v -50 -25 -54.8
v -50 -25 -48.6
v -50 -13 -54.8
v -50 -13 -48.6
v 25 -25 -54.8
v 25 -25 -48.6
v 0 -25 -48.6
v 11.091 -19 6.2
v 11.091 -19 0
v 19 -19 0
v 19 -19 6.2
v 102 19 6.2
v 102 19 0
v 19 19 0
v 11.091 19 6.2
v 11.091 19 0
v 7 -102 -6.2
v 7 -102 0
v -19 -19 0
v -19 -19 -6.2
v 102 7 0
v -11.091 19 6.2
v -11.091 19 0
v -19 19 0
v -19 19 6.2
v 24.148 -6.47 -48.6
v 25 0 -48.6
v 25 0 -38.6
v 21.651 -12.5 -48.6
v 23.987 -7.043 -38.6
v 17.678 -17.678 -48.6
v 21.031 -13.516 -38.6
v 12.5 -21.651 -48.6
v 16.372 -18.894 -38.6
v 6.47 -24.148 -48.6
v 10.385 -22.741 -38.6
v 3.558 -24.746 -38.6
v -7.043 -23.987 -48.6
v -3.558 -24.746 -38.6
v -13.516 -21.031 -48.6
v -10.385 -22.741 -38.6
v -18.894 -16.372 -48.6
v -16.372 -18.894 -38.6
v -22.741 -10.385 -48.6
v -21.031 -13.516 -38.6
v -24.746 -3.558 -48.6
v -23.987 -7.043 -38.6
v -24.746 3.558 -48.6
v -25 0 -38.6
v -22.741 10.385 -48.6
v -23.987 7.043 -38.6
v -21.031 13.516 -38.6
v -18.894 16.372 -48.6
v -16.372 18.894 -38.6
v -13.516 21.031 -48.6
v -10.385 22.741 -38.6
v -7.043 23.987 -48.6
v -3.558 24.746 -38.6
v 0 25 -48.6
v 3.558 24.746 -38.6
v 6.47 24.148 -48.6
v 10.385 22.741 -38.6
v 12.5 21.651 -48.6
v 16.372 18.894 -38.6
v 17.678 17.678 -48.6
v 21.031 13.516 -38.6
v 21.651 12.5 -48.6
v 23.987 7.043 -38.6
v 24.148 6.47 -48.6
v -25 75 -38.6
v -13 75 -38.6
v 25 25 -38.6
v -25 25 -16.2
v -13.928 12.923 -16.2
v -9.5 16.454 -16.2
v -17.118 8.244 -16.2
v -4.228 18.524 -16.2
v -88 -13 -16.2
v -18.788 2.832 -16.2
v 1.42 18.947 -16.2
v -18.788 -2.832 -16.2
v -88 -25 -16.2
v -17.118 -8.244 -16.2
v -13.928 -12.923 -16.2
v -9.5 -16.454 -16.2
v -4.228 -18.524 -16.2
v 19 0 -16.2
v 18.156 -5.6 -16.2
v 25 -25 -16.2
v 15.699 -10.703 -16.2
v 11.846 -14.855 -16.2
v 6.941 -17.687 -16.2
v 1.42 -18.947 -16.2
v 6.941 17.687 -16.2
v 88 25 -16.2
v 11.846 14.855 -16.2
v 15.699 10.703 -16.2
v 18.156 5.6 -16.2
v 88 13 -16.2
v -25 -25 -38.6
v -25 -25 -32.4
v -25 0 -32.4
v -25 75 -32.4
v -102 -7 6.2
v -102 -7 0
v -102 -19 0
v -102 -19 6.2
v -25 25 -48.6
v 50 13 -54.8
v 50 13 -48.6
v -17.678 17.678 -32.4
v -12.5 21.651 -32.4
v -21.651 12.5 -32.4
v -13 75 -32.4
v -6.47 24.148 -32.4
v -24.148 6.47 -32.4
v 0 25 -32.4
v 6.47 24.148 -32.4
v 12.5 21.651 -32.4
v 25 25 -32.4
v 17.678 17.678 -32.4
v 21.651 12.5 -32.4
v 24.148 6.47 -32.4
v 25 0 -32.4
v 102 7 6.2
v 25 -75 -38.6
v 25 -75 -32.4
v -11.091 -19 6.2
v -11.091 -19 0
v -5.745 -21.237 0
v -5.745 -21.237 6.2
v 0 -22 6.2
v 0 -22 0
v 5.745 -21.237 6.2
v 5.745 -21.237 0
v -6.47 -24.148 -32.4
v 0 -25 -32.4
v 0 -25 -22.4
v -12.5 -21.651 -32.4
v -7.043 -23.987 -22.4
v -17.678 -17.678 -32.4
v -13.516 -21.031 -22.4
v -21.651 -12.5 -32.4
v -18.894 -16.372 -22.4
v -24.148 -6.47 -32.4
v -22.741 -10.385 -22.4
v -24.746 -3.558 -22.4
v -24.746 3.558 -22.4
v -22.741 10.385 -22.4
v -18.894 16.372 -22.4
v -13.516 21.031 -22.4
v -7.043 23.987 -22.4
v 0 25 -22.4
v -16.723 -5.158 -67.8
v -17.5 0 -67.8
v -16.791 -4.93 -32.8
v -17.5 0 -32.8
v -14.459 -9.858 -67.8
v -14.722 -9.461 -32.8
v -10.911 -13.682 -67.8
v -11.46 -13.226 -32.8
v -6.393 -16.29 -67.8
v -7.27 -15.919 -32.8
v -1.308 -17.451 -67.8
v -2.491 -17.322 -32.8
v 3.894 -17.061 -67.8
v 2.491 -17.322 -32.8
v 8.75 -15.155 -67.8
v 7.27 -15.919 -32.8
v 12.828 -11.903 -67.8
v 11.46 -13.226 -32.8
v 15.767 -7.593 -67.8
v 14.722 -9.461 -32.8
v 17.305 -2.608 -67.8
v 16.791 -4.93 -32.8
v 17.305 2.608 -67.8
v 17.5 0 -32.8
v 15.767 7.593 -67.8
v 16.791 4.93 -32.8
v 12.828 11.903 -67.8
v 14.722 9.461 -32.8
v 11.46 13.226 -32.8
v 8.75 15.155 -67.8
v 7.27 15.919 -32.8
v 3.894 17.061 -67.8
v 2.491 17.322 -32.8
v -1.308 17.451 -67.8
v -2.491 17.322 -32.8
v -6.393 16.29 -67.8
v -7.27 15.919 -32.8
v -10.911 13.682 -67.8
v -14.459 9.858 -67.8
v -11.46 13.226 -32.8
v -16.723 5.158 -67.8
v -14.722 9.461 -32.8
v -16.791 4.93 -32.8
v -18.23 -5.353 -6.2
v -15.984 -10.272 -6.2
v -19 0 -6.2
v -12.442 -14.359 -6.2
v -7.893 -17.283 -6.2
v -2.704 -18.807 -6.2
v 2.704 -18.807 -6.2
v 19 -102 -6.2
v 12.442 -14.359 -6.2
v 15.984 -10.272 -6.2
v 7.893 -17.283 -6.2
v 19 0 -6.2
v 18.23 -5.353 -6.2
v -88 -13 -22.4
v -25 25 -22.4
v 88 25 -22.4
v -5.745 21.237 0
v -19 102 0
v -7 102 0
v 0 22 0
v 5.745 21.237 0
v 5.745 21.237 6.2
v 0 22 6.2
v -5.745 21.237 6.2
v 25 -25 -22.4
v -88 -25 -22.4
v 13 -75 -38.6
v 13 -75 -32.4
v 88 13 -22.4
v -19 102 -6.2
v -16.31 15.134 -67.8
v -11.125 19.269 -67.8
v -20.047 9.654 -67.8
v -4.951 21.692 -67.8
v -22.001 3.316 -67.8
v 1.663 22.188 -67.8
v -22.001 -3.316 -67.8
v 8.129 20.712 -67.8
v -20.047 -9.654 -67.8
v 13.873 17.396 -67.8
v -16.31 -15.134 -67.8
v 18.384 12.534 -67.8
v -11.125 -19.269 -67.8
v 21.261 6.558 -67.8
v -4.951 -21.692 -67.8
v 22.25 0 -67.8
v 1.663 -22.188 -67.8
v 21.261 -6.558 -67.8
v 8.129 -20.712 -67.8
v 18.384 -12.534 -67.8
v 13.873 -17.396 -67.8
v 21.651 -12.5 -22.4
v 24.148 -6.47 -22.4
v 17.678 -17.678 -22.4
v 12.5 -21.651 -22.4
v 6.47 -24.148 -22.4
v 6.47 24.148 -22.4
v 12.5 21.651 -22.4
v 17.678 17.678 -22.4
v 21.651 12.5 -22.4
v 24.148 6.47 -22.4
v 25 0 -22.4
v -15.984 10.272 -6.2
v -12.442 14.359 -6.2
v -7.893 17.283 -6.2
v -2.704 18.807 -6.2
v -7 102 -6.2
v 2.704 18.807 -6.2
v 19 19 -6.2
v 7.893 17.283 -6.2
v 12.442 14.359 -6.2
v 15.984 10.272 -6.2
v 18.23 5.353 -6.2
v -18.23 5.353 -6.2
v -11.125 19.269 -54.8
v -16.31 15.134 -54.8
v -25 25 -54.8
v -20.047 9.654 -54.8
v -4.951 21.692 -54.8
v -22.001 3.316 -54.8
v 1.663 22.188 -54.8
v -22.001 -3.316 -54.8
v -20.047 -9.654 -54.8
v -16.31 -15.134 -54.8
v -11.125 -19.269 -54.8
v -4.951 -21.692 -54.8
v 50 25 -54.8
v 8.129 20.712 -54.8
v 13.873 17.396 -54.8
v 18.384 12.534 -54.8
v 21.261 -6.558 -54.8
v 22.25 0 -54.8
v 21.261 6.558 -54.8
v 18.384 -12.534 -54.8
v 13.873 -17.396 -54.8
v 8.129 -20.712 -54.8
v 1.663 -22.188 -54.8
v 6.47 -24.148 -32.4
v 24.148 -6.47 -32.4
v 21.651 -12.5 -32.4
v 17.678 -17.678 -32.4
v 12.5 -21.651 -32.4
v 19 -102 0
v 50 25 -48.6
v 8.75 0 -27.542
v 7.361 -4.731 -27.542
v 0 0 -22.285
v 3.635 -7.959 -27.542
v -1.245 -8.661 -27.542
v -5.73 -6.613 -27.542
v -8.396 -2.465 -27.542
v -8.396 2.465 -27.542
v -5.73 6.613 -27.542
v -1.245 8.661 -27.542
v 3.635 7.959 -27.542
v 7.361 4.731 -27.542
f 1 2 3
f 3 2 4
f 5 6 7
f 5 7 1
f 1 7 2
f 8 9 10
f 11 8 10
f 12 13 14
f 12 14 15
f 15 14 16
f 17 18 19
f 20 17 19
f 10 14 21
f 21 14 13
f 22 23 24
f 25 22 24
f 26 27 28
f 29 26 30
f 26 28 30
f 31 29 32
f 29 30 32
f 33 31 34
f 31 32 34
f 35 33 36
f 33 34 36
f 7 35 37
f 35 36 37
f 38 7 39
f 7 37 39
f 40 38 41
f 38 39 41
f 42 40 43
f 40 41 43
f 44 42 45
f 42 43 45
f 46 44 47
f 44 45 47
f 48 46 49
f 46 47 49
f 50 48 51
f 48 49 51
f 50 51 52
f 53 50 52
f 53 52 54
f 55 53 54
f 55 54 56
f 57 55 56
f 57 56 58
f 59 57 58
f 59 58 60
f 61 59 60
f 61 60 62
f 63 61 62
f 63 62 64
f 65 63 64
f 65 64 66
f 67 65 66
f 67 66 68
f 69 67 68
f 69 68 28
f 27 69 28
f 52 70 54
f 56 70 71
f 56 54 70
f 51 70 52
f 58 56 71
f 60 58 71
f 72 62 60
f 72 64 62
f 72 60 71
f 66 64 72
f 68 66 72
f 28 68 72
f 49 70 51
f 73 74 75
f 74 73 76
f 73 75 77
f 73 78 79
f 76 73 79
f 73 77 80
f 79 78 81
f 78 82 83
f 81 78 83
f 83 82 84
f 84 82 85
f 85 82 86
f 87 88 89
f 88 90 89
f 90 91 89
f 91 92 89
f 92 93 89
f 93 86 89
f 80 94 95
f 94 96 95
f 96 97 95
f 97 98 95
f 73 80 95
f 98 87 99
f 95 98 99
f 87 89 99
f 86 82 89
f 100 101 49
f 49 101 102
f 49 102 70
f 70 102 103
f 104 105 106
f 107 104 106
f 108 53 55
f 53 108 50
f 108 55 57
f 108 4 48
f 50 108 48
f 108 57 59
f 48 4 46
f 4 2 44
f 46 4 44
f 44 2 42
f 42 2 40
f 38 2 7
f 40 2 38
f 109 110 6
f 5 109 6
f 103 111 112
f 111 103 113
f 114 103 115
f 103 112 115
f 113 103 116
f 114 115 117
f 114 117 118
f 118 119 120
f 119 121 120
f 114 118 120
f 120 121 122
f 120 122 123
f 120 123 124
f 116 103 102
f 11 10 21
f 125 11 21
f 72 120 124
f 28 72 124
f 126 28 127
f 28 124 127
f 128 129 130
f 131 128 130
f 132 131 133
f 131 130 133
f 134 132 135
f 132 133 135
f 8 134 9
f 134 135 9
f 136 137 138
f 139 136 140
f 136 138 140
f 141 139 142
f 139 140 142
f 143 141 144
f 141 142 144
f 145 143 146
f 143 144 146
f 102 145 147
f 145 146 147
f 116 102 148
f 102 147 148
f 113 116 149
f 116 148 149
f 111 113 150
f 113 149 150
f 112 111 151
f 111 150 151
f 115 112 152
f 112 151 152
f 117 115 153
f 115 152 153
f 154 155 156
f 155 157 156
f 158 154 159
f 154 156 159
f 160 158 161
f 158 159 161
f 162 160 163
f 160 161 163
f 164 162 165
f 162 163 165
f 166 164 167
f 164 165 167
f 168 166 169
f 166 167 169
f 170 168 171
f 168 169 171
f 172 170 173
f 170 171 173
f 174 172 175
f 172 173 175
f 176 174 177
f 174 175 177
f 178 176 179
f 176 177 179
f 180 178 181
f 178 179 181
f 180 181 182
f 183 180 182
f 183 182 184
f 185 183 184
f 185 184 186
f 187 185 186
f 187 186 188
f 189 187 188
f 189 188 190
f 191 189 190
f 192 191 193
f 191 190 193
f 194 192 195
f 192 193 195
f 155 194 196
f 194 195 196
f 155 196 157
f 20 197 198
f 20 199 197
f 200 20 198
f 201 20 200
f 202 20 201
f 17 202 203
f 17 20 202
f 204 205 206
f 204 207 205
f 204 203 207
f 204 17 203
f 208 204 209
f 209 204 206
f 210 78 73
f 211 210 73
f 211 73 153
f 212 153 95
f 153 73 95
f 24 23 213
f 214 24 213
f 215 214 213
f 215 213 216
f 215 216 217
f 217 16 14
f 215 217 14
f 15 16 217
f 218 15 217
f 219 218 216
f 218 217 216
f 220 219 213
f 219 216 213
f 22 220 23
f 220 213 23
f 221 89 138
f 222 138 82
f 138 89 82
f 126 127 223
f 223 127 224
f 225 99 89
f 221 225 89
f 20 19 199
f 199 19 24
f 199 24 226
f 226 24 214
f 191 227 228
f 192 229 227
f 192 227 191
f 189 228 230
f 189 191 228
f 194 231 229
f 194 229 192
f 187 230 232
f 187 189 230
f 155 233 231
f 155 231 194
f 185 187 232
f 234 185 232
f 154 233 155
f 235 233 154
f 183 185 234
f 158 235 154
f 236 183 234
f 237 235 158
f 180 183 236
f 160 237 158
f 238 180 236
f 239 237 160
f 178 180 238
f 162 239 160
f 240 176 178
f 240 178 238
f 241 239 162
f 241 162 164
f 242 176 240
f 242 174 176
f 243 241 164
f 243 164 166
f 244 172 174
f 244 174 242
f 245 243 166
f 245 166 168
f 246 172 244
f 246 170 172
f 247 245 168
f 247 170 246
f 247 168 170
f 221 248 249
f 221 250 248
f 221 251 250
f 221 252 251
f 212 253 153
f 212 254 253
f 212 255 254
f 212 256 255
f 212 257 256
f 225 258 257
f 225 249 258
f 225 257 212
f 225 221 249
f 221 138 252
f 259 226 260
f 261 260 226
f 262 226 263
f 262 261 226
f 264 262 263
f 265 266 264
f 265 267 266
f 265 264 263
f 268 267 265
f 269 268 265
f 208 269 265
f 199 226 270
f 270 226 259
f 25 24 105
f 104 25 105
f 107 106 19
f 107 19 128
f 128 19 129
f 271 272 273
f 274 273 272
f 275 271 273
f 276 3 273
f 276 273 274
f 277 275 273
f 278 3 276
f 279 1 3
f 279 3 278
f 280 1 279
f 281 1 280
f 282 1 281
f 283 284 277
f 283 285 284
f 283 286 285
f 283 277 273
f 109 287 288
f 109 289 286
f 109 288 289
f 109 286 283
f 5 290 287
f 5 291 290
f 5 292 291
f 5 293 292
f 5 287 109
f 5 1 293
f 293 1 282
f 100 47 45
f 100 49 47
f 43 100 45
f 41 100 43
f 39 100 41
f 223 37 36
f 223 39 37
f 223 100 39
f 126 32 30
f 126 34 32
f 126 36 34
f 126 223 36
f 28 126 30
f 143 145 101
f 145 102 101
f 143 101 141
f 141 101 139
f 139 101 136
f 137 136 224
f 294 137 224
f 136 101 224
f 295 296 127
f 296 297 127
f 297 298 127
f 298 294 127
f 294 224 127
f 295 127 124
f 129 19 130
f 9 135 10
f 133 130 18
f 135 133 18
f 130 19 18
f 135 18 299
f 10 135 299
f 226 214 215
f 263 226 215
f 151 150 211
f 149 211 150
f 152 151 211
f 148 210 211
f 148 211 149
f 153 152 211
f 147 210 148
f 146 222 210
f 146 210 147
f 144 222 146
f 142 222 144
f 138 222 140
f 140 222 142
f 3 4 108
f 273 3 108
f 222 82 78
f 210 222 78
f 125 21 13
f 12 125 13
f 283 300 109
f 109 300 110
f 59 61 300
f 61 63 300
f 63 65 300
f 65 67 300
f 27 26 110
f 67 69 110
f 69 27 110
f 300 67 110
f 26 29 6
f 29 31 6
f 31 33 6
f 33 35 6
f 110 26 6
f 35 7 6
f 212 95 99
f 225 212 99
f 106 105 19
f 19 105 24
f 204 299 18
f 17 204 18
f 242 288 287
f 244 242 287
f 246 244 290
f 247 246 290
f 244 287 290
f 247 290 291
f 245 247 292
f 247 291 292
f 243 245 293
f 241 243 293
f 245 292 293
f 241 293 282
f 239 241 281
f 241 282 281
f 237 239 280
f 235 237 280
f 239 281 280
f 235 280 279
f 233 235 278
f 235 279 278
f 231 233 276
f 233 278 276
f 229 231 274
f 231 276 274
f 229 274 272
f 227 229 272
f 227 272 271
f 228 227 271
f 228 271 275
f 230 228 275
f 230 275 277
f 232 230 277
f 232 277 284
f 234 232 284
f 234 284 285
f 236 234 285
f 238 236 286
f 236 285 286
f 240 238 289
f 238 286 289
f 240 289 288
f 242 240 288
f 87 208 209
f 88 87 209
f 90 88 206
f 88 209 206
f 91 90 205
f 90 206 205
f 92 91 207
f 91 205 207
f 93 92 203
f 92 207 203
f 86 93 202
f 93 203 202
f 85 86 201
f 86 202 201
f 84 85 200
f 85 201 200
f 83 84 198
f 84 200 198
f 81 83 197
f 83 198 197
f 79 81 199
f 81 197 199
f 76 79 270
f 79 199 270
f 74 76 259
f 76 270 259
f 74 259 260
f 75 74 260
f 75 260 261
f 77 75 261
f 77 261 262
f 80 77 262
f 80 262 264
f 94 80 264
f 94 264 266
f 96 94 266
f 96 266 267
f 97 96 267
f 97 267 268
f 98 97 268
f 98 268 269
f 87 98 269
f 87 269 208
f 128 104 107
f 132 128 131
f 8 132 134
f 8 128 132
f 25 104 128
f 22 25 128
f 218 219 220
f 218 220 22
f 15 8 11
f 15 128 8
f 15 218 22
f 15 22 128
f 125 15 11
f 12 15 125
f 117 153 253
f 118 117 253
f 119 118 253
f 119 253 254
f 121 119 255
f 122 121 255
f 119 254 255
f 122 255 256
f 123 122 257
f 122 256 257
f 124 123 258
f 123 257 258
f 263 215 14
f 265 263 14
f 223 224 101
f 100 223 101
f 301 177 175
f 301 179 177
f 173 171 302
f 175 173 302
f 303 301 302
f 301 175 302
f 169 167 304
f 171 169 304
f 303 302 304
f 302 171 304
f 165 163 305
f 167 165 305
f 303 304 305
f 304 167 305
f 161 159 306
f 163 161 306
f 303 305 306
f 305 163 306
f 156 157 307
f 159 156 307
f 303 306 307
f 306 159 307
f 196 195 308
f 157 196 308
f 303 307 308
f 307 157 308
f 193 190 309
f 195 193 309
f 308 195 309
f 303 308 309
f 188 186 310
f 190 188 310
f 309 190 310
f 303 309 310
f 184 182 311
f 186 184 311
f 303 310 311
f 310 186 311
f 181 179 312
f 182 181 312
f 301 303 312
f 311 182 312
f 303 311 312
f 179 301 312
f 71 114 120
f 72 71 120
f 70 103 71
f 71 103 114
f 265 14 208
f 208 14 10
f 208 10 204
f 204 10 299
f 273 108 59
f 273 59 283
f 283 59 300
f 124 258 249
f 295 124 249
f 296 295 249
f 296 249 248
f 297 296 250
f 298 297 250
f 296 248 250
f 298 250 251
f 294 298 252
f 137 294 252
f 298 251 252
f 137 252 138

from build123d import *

# Parameters (mm, degrees)
F1_DEPTH  = 6.2
F3_DEPTH  = 6.2
F5_DEPTH  = 10
F6_W      = 50
F6_H      = 50
F6_R      = 19
F7_DEPTH  = 6.2
F9_DEPTH  = 10
F11_DEPTH = 6.2
F13_DEPTH = 10
F15_DEPTH = 6.2
F16_R     = 22.25
F17_DEPTH = 13
F19_D     = 35
F19_DEPTH = 35
F19_TIP   = 10.515060833


with BuildPart() as f1:
    # F0 (on Top) → F1 (new body)
    with BuildSketch(Plane.XY):
        with BuildLine():
            Line((102, 19), (11.0905365064, 19))
            ThreePointArc((11.0905365064, 19), (0, 22), (-11.0905365064, 19))
            Line((-11.0905365064, 19), (-19, 19))
            Line((-19, 19), (-102, -7))
            Line((-102, -7), (-102, -19))
            Line((-102, -19), (-11.0905365064, -19))
            ThreePointArc((-11.0905365064, -19), (0, -22), (11.0905365064, -19))
            Line((11.0905365064, -19), (19, -19))
            Line((19, -19), (102, 7))
            Line((102, 7), (102, 19))
        make_face()
    extrude(amount=F1_DEPTH)

    # F2 (on face) → F3 (join)
    with BuildSketch(Plane(origin=(0, 0, 0), x_dir=(1, 0, 0), z_dir=(0, 0, -1))):
        with BuildLine():
            Line((-19, 19), (-19, 0))
            Line((-19, 0), (-19, -19))
            Line((-19, -19), (-11.0905365064, -19))
            ThreePointArc((-11.0905365064, -19), (0, -22), (11.0905365064, -19))
            Line((11.0905365064, -19), (19, -19))
            Line((19, -19), (19, 0))
            Line((19, 0), (19, 19))
            Line((19, 19), (11.0905365064, 19))
            ThreePointArc((11.0905365064, 19), (0, 22), (-11.0905365064, 19))
            Line((-11.0905365064, 19), (-19, 19))
        make_face()
        with BuildLine():
            Line((-11.0905365064, -19), (-19, -19))
            Line((-19, -19), (-19, -102))
            Line((-19, -102), (-7, -102))
            Line((-7, -102), (19, -19))
            Line((19, -19), (11.0905365064, -19))
            ThreePointArc((11.0905365064, -19), (0, -22), (-11.0905365064, -19))
        make_face()
        with BuildLine():
            Line((7, 102), (-19, 19))
            Line((-19, 19), (-11.0905365064, 19))
            ThreePointArc((-11.0905365064, 19), (0, 22), (11.0905365064, 19))
            Line((11.0905365064, 19), (19, 19))
            Line((19, 19), (19, 102))
            Line((19, 102), (7, 102))
        make_face()
    extrude(amount=F3_DEPTH)

    # F4 (on face) → F5 (join)
    with BuildSketch(Plane(origin=(0, 0, -6.2), x_dir=(1, 0, 0), z_dir=(0, 0, -1))):
        with BuildLine():
            ThreePointArc((-19, 0), (0, -19), (19, 0))
            ThreePointArc((19, 0), (0, 19), (-19, 0))
        make_face()
    extrude(amount=F5_DEPTH)

    # F6 (on face) → F7 (join)
    with BuildSketch(Plane(origin=(0, 0, -16.2), x_dir=(1, 0, 0), z_dir=(0, 0, -1))):
        Rectangle(F6_W, F6_H)
        Circle(F6_R, mode=Mode.SUBTRACT)
        Polygon((25, 25), (25, -25), (88, -25), (88, -13), align=None)
        Polygon((-88, 13), (-25, -25), (-25, 25), (-88, 25), align=None)
        Circle(F6_R)
    extrude(amount=F7_DEPTH)

    # F8 (on face) → F9 (join)
    with BuildSketch(Plane(origin=(0, 0, -22.4), x_dir=(1, 0, 0), z_dir=(0, 0, -1))):
        with BuildLine():
            ThreePointArc((-5.83e-08, -25), (17.677669509, -17.6776695503), (25, 0))
            ThreePointArc((25, 0), (17.6776695297, 17.6776695297), (0, 25))
            ThreePointArc((0, 25), (-25, 2.92e-08), (-5.83e-08, -25))
        make_face()
    extrude(amount=F9_DEPTH)

    # F10 (on face) → F11 (join)
    with BuildSketch(Plane(origin=(0, 0, -32.4), x_dir=(1, 0, 0), z_dir=(0, 0, -1))):
        Polygon((13, 75), (-25, 25), (4.22e-08, 25), (25, 25), (25, 75), align=None)
        with BuildLine():
            ThreePointArc((4.22e-08, 25), (17.6776695446, 17.6776695147), (25, 0))
            Line((25, 0), (25, 25))
            Line((25, 25), (4.22e-08, 25))
        make_face()
        with BuildLine():
            ThreePointArc((-25, 0), (-17.6776695332, -17.6776695262), (-9.9e-09, -25))
            ThreePointArc((-9.9e-09, -25), (17.6776695262, -17.6776695332), (25, 0))
            ThreePointArc((25, 0), (17.6776695446, 17.6776695147), (4.22e-08, 25))
            ThreePointArc((4.22e-08, 25), (-17.6776695147, 17.6776695446), (-25, 0))
        make_face()
        with BuildLine():
            ThreePointArc((25, 0), (17.6776695262, -17.6776695332), (-9.9e-09, -25))
            Line((-9.9e-09, -25), (25, -25))
            Line((25, -25), (25, 0))
        make_face()
        Polygon((-9.9e-09, -25), (-25, -25), (-25, -75), (-13, -75), (25, -25), align=None)
        with BuildLine():
            Line((-25, 0), (-25, -25))
            Line((-25, -25), (-9.9e-09, -25))
            ThreePointArc((-9.9e-09, -25), (-17.6776695332, -17.6776695262), (-25, 0))
        make_face()
        with BuildLine():
            Line((-25, 25), (-25, 0))
            ThreePointArc((-25, 0), (-17.6776695147, 17.6776695446), (4.22e-08, 25))
            Line((4.22e-08, 25), (-25, 25))
        make_face()
    extrude(amount=F11_DEPTH)

    # F12 (on face) → F13 (join)
    with BuildSketch(Plane(origin=(0, 0, -38.6), x_dir=(1, 0, 0), z_dir=(0, 0, -1))):
        with BuildLine():
            ThreePointArc((-25, 2.61e-08), (-1.3e-08, -25), (25, 0))
            ThreePointArc((25, 0), (1.3e-08, 25), (-25, 2.61e-08))
        make_face()
    extrude(amount=F13_DEPTH)

    # F14 (on face) → F15 (join)
    with BuildSketch(Plane(origin=(0, 0, -48.6), x_dir=(1, 0, 0), z_dir=(0, 0, -1))):
        with BuildLine():
            ThreePointArc((-25, 0), (-17.6776695204, -17.6776695389), (2.61e-08, -25))
            ThreePointArc((2.61e-08, -25), (17.6776695389, -17.6776695204), (25, 0))
            ThreePointArc((25, 0), (17.6776695389, 17.6776695204), (2.61e-08, 25))
            ThreePointArc((2.61e-08, 25), (-17.6776695204, 17.6776695389), (-25, 0))
        make_face()
        with BuildLine():
            ThreePointArc((2.61e-08, 25), (17.6776695389, 17.6776695204), (25, 0))
            Line((25, 0), (25, 25))
            Line((25, 25), (2.61e-08, 25))
        make_face()
        with BuildLine():
            Line((2.61e-08, -25), (25, -25))
            Line((25, -25), (25, 0))
            ThreePointArc((25, 0), (17.6776695389, -17.6776695204), (2.61e-08, -25))
        make_face()
        with BuildLine():
            Line((-25, -25), (2.61e-08, -25))
            ThreePointArc((2.61e-08, -25), (-17.6776695204, -17.6776695389), (-25, 0))
            Line((-25, 0), (-25, -25))
        make_face()
        with BuildLine():
            Line((-25, 25), (-25, 0))
            ThreePointArc((-25, 0), (-17.6776695204, 17.6776695389), (2.61e-08, 25))
            Line((2.61e-08, 25), (-25, 25))
        make_face()
        Polygon((-50, 13), (-25, -25), (-25, 0), (-25, 25), (-50, 25), align=None)
        Polygon((25, 0), (25, -25), (50, -25), (50, -13), (25, 25), align=None)
    extrude(amount=F15_DEPTH)

    # F16 (on face) → F17 (join)
    with BuildSketch(Plane(origin=(0, 0, -54.8), x_dir=(1, 0, 0), z_dir=(0, 0, -1))):
        Circle(F16_R)
    extrude(amount=F17_DEPTH)

    # F19
    with Locations(Plane(origin=(0, 0, -67.8), x_dir=(1, 0, 0), z_dir=(0, 0, -1))):
        with Locations((0, 0)):
            Hole(F19_D / 2, depth=F19_DEPTH)
            with Locations((0, 0, -(F19_DEPTH + F19_TIP / 2))):  # 118° drill point
                Cone(0, F19_D / 2, F19_TIP, mode=Mode.SUBTRACT)


solid = f1.part
